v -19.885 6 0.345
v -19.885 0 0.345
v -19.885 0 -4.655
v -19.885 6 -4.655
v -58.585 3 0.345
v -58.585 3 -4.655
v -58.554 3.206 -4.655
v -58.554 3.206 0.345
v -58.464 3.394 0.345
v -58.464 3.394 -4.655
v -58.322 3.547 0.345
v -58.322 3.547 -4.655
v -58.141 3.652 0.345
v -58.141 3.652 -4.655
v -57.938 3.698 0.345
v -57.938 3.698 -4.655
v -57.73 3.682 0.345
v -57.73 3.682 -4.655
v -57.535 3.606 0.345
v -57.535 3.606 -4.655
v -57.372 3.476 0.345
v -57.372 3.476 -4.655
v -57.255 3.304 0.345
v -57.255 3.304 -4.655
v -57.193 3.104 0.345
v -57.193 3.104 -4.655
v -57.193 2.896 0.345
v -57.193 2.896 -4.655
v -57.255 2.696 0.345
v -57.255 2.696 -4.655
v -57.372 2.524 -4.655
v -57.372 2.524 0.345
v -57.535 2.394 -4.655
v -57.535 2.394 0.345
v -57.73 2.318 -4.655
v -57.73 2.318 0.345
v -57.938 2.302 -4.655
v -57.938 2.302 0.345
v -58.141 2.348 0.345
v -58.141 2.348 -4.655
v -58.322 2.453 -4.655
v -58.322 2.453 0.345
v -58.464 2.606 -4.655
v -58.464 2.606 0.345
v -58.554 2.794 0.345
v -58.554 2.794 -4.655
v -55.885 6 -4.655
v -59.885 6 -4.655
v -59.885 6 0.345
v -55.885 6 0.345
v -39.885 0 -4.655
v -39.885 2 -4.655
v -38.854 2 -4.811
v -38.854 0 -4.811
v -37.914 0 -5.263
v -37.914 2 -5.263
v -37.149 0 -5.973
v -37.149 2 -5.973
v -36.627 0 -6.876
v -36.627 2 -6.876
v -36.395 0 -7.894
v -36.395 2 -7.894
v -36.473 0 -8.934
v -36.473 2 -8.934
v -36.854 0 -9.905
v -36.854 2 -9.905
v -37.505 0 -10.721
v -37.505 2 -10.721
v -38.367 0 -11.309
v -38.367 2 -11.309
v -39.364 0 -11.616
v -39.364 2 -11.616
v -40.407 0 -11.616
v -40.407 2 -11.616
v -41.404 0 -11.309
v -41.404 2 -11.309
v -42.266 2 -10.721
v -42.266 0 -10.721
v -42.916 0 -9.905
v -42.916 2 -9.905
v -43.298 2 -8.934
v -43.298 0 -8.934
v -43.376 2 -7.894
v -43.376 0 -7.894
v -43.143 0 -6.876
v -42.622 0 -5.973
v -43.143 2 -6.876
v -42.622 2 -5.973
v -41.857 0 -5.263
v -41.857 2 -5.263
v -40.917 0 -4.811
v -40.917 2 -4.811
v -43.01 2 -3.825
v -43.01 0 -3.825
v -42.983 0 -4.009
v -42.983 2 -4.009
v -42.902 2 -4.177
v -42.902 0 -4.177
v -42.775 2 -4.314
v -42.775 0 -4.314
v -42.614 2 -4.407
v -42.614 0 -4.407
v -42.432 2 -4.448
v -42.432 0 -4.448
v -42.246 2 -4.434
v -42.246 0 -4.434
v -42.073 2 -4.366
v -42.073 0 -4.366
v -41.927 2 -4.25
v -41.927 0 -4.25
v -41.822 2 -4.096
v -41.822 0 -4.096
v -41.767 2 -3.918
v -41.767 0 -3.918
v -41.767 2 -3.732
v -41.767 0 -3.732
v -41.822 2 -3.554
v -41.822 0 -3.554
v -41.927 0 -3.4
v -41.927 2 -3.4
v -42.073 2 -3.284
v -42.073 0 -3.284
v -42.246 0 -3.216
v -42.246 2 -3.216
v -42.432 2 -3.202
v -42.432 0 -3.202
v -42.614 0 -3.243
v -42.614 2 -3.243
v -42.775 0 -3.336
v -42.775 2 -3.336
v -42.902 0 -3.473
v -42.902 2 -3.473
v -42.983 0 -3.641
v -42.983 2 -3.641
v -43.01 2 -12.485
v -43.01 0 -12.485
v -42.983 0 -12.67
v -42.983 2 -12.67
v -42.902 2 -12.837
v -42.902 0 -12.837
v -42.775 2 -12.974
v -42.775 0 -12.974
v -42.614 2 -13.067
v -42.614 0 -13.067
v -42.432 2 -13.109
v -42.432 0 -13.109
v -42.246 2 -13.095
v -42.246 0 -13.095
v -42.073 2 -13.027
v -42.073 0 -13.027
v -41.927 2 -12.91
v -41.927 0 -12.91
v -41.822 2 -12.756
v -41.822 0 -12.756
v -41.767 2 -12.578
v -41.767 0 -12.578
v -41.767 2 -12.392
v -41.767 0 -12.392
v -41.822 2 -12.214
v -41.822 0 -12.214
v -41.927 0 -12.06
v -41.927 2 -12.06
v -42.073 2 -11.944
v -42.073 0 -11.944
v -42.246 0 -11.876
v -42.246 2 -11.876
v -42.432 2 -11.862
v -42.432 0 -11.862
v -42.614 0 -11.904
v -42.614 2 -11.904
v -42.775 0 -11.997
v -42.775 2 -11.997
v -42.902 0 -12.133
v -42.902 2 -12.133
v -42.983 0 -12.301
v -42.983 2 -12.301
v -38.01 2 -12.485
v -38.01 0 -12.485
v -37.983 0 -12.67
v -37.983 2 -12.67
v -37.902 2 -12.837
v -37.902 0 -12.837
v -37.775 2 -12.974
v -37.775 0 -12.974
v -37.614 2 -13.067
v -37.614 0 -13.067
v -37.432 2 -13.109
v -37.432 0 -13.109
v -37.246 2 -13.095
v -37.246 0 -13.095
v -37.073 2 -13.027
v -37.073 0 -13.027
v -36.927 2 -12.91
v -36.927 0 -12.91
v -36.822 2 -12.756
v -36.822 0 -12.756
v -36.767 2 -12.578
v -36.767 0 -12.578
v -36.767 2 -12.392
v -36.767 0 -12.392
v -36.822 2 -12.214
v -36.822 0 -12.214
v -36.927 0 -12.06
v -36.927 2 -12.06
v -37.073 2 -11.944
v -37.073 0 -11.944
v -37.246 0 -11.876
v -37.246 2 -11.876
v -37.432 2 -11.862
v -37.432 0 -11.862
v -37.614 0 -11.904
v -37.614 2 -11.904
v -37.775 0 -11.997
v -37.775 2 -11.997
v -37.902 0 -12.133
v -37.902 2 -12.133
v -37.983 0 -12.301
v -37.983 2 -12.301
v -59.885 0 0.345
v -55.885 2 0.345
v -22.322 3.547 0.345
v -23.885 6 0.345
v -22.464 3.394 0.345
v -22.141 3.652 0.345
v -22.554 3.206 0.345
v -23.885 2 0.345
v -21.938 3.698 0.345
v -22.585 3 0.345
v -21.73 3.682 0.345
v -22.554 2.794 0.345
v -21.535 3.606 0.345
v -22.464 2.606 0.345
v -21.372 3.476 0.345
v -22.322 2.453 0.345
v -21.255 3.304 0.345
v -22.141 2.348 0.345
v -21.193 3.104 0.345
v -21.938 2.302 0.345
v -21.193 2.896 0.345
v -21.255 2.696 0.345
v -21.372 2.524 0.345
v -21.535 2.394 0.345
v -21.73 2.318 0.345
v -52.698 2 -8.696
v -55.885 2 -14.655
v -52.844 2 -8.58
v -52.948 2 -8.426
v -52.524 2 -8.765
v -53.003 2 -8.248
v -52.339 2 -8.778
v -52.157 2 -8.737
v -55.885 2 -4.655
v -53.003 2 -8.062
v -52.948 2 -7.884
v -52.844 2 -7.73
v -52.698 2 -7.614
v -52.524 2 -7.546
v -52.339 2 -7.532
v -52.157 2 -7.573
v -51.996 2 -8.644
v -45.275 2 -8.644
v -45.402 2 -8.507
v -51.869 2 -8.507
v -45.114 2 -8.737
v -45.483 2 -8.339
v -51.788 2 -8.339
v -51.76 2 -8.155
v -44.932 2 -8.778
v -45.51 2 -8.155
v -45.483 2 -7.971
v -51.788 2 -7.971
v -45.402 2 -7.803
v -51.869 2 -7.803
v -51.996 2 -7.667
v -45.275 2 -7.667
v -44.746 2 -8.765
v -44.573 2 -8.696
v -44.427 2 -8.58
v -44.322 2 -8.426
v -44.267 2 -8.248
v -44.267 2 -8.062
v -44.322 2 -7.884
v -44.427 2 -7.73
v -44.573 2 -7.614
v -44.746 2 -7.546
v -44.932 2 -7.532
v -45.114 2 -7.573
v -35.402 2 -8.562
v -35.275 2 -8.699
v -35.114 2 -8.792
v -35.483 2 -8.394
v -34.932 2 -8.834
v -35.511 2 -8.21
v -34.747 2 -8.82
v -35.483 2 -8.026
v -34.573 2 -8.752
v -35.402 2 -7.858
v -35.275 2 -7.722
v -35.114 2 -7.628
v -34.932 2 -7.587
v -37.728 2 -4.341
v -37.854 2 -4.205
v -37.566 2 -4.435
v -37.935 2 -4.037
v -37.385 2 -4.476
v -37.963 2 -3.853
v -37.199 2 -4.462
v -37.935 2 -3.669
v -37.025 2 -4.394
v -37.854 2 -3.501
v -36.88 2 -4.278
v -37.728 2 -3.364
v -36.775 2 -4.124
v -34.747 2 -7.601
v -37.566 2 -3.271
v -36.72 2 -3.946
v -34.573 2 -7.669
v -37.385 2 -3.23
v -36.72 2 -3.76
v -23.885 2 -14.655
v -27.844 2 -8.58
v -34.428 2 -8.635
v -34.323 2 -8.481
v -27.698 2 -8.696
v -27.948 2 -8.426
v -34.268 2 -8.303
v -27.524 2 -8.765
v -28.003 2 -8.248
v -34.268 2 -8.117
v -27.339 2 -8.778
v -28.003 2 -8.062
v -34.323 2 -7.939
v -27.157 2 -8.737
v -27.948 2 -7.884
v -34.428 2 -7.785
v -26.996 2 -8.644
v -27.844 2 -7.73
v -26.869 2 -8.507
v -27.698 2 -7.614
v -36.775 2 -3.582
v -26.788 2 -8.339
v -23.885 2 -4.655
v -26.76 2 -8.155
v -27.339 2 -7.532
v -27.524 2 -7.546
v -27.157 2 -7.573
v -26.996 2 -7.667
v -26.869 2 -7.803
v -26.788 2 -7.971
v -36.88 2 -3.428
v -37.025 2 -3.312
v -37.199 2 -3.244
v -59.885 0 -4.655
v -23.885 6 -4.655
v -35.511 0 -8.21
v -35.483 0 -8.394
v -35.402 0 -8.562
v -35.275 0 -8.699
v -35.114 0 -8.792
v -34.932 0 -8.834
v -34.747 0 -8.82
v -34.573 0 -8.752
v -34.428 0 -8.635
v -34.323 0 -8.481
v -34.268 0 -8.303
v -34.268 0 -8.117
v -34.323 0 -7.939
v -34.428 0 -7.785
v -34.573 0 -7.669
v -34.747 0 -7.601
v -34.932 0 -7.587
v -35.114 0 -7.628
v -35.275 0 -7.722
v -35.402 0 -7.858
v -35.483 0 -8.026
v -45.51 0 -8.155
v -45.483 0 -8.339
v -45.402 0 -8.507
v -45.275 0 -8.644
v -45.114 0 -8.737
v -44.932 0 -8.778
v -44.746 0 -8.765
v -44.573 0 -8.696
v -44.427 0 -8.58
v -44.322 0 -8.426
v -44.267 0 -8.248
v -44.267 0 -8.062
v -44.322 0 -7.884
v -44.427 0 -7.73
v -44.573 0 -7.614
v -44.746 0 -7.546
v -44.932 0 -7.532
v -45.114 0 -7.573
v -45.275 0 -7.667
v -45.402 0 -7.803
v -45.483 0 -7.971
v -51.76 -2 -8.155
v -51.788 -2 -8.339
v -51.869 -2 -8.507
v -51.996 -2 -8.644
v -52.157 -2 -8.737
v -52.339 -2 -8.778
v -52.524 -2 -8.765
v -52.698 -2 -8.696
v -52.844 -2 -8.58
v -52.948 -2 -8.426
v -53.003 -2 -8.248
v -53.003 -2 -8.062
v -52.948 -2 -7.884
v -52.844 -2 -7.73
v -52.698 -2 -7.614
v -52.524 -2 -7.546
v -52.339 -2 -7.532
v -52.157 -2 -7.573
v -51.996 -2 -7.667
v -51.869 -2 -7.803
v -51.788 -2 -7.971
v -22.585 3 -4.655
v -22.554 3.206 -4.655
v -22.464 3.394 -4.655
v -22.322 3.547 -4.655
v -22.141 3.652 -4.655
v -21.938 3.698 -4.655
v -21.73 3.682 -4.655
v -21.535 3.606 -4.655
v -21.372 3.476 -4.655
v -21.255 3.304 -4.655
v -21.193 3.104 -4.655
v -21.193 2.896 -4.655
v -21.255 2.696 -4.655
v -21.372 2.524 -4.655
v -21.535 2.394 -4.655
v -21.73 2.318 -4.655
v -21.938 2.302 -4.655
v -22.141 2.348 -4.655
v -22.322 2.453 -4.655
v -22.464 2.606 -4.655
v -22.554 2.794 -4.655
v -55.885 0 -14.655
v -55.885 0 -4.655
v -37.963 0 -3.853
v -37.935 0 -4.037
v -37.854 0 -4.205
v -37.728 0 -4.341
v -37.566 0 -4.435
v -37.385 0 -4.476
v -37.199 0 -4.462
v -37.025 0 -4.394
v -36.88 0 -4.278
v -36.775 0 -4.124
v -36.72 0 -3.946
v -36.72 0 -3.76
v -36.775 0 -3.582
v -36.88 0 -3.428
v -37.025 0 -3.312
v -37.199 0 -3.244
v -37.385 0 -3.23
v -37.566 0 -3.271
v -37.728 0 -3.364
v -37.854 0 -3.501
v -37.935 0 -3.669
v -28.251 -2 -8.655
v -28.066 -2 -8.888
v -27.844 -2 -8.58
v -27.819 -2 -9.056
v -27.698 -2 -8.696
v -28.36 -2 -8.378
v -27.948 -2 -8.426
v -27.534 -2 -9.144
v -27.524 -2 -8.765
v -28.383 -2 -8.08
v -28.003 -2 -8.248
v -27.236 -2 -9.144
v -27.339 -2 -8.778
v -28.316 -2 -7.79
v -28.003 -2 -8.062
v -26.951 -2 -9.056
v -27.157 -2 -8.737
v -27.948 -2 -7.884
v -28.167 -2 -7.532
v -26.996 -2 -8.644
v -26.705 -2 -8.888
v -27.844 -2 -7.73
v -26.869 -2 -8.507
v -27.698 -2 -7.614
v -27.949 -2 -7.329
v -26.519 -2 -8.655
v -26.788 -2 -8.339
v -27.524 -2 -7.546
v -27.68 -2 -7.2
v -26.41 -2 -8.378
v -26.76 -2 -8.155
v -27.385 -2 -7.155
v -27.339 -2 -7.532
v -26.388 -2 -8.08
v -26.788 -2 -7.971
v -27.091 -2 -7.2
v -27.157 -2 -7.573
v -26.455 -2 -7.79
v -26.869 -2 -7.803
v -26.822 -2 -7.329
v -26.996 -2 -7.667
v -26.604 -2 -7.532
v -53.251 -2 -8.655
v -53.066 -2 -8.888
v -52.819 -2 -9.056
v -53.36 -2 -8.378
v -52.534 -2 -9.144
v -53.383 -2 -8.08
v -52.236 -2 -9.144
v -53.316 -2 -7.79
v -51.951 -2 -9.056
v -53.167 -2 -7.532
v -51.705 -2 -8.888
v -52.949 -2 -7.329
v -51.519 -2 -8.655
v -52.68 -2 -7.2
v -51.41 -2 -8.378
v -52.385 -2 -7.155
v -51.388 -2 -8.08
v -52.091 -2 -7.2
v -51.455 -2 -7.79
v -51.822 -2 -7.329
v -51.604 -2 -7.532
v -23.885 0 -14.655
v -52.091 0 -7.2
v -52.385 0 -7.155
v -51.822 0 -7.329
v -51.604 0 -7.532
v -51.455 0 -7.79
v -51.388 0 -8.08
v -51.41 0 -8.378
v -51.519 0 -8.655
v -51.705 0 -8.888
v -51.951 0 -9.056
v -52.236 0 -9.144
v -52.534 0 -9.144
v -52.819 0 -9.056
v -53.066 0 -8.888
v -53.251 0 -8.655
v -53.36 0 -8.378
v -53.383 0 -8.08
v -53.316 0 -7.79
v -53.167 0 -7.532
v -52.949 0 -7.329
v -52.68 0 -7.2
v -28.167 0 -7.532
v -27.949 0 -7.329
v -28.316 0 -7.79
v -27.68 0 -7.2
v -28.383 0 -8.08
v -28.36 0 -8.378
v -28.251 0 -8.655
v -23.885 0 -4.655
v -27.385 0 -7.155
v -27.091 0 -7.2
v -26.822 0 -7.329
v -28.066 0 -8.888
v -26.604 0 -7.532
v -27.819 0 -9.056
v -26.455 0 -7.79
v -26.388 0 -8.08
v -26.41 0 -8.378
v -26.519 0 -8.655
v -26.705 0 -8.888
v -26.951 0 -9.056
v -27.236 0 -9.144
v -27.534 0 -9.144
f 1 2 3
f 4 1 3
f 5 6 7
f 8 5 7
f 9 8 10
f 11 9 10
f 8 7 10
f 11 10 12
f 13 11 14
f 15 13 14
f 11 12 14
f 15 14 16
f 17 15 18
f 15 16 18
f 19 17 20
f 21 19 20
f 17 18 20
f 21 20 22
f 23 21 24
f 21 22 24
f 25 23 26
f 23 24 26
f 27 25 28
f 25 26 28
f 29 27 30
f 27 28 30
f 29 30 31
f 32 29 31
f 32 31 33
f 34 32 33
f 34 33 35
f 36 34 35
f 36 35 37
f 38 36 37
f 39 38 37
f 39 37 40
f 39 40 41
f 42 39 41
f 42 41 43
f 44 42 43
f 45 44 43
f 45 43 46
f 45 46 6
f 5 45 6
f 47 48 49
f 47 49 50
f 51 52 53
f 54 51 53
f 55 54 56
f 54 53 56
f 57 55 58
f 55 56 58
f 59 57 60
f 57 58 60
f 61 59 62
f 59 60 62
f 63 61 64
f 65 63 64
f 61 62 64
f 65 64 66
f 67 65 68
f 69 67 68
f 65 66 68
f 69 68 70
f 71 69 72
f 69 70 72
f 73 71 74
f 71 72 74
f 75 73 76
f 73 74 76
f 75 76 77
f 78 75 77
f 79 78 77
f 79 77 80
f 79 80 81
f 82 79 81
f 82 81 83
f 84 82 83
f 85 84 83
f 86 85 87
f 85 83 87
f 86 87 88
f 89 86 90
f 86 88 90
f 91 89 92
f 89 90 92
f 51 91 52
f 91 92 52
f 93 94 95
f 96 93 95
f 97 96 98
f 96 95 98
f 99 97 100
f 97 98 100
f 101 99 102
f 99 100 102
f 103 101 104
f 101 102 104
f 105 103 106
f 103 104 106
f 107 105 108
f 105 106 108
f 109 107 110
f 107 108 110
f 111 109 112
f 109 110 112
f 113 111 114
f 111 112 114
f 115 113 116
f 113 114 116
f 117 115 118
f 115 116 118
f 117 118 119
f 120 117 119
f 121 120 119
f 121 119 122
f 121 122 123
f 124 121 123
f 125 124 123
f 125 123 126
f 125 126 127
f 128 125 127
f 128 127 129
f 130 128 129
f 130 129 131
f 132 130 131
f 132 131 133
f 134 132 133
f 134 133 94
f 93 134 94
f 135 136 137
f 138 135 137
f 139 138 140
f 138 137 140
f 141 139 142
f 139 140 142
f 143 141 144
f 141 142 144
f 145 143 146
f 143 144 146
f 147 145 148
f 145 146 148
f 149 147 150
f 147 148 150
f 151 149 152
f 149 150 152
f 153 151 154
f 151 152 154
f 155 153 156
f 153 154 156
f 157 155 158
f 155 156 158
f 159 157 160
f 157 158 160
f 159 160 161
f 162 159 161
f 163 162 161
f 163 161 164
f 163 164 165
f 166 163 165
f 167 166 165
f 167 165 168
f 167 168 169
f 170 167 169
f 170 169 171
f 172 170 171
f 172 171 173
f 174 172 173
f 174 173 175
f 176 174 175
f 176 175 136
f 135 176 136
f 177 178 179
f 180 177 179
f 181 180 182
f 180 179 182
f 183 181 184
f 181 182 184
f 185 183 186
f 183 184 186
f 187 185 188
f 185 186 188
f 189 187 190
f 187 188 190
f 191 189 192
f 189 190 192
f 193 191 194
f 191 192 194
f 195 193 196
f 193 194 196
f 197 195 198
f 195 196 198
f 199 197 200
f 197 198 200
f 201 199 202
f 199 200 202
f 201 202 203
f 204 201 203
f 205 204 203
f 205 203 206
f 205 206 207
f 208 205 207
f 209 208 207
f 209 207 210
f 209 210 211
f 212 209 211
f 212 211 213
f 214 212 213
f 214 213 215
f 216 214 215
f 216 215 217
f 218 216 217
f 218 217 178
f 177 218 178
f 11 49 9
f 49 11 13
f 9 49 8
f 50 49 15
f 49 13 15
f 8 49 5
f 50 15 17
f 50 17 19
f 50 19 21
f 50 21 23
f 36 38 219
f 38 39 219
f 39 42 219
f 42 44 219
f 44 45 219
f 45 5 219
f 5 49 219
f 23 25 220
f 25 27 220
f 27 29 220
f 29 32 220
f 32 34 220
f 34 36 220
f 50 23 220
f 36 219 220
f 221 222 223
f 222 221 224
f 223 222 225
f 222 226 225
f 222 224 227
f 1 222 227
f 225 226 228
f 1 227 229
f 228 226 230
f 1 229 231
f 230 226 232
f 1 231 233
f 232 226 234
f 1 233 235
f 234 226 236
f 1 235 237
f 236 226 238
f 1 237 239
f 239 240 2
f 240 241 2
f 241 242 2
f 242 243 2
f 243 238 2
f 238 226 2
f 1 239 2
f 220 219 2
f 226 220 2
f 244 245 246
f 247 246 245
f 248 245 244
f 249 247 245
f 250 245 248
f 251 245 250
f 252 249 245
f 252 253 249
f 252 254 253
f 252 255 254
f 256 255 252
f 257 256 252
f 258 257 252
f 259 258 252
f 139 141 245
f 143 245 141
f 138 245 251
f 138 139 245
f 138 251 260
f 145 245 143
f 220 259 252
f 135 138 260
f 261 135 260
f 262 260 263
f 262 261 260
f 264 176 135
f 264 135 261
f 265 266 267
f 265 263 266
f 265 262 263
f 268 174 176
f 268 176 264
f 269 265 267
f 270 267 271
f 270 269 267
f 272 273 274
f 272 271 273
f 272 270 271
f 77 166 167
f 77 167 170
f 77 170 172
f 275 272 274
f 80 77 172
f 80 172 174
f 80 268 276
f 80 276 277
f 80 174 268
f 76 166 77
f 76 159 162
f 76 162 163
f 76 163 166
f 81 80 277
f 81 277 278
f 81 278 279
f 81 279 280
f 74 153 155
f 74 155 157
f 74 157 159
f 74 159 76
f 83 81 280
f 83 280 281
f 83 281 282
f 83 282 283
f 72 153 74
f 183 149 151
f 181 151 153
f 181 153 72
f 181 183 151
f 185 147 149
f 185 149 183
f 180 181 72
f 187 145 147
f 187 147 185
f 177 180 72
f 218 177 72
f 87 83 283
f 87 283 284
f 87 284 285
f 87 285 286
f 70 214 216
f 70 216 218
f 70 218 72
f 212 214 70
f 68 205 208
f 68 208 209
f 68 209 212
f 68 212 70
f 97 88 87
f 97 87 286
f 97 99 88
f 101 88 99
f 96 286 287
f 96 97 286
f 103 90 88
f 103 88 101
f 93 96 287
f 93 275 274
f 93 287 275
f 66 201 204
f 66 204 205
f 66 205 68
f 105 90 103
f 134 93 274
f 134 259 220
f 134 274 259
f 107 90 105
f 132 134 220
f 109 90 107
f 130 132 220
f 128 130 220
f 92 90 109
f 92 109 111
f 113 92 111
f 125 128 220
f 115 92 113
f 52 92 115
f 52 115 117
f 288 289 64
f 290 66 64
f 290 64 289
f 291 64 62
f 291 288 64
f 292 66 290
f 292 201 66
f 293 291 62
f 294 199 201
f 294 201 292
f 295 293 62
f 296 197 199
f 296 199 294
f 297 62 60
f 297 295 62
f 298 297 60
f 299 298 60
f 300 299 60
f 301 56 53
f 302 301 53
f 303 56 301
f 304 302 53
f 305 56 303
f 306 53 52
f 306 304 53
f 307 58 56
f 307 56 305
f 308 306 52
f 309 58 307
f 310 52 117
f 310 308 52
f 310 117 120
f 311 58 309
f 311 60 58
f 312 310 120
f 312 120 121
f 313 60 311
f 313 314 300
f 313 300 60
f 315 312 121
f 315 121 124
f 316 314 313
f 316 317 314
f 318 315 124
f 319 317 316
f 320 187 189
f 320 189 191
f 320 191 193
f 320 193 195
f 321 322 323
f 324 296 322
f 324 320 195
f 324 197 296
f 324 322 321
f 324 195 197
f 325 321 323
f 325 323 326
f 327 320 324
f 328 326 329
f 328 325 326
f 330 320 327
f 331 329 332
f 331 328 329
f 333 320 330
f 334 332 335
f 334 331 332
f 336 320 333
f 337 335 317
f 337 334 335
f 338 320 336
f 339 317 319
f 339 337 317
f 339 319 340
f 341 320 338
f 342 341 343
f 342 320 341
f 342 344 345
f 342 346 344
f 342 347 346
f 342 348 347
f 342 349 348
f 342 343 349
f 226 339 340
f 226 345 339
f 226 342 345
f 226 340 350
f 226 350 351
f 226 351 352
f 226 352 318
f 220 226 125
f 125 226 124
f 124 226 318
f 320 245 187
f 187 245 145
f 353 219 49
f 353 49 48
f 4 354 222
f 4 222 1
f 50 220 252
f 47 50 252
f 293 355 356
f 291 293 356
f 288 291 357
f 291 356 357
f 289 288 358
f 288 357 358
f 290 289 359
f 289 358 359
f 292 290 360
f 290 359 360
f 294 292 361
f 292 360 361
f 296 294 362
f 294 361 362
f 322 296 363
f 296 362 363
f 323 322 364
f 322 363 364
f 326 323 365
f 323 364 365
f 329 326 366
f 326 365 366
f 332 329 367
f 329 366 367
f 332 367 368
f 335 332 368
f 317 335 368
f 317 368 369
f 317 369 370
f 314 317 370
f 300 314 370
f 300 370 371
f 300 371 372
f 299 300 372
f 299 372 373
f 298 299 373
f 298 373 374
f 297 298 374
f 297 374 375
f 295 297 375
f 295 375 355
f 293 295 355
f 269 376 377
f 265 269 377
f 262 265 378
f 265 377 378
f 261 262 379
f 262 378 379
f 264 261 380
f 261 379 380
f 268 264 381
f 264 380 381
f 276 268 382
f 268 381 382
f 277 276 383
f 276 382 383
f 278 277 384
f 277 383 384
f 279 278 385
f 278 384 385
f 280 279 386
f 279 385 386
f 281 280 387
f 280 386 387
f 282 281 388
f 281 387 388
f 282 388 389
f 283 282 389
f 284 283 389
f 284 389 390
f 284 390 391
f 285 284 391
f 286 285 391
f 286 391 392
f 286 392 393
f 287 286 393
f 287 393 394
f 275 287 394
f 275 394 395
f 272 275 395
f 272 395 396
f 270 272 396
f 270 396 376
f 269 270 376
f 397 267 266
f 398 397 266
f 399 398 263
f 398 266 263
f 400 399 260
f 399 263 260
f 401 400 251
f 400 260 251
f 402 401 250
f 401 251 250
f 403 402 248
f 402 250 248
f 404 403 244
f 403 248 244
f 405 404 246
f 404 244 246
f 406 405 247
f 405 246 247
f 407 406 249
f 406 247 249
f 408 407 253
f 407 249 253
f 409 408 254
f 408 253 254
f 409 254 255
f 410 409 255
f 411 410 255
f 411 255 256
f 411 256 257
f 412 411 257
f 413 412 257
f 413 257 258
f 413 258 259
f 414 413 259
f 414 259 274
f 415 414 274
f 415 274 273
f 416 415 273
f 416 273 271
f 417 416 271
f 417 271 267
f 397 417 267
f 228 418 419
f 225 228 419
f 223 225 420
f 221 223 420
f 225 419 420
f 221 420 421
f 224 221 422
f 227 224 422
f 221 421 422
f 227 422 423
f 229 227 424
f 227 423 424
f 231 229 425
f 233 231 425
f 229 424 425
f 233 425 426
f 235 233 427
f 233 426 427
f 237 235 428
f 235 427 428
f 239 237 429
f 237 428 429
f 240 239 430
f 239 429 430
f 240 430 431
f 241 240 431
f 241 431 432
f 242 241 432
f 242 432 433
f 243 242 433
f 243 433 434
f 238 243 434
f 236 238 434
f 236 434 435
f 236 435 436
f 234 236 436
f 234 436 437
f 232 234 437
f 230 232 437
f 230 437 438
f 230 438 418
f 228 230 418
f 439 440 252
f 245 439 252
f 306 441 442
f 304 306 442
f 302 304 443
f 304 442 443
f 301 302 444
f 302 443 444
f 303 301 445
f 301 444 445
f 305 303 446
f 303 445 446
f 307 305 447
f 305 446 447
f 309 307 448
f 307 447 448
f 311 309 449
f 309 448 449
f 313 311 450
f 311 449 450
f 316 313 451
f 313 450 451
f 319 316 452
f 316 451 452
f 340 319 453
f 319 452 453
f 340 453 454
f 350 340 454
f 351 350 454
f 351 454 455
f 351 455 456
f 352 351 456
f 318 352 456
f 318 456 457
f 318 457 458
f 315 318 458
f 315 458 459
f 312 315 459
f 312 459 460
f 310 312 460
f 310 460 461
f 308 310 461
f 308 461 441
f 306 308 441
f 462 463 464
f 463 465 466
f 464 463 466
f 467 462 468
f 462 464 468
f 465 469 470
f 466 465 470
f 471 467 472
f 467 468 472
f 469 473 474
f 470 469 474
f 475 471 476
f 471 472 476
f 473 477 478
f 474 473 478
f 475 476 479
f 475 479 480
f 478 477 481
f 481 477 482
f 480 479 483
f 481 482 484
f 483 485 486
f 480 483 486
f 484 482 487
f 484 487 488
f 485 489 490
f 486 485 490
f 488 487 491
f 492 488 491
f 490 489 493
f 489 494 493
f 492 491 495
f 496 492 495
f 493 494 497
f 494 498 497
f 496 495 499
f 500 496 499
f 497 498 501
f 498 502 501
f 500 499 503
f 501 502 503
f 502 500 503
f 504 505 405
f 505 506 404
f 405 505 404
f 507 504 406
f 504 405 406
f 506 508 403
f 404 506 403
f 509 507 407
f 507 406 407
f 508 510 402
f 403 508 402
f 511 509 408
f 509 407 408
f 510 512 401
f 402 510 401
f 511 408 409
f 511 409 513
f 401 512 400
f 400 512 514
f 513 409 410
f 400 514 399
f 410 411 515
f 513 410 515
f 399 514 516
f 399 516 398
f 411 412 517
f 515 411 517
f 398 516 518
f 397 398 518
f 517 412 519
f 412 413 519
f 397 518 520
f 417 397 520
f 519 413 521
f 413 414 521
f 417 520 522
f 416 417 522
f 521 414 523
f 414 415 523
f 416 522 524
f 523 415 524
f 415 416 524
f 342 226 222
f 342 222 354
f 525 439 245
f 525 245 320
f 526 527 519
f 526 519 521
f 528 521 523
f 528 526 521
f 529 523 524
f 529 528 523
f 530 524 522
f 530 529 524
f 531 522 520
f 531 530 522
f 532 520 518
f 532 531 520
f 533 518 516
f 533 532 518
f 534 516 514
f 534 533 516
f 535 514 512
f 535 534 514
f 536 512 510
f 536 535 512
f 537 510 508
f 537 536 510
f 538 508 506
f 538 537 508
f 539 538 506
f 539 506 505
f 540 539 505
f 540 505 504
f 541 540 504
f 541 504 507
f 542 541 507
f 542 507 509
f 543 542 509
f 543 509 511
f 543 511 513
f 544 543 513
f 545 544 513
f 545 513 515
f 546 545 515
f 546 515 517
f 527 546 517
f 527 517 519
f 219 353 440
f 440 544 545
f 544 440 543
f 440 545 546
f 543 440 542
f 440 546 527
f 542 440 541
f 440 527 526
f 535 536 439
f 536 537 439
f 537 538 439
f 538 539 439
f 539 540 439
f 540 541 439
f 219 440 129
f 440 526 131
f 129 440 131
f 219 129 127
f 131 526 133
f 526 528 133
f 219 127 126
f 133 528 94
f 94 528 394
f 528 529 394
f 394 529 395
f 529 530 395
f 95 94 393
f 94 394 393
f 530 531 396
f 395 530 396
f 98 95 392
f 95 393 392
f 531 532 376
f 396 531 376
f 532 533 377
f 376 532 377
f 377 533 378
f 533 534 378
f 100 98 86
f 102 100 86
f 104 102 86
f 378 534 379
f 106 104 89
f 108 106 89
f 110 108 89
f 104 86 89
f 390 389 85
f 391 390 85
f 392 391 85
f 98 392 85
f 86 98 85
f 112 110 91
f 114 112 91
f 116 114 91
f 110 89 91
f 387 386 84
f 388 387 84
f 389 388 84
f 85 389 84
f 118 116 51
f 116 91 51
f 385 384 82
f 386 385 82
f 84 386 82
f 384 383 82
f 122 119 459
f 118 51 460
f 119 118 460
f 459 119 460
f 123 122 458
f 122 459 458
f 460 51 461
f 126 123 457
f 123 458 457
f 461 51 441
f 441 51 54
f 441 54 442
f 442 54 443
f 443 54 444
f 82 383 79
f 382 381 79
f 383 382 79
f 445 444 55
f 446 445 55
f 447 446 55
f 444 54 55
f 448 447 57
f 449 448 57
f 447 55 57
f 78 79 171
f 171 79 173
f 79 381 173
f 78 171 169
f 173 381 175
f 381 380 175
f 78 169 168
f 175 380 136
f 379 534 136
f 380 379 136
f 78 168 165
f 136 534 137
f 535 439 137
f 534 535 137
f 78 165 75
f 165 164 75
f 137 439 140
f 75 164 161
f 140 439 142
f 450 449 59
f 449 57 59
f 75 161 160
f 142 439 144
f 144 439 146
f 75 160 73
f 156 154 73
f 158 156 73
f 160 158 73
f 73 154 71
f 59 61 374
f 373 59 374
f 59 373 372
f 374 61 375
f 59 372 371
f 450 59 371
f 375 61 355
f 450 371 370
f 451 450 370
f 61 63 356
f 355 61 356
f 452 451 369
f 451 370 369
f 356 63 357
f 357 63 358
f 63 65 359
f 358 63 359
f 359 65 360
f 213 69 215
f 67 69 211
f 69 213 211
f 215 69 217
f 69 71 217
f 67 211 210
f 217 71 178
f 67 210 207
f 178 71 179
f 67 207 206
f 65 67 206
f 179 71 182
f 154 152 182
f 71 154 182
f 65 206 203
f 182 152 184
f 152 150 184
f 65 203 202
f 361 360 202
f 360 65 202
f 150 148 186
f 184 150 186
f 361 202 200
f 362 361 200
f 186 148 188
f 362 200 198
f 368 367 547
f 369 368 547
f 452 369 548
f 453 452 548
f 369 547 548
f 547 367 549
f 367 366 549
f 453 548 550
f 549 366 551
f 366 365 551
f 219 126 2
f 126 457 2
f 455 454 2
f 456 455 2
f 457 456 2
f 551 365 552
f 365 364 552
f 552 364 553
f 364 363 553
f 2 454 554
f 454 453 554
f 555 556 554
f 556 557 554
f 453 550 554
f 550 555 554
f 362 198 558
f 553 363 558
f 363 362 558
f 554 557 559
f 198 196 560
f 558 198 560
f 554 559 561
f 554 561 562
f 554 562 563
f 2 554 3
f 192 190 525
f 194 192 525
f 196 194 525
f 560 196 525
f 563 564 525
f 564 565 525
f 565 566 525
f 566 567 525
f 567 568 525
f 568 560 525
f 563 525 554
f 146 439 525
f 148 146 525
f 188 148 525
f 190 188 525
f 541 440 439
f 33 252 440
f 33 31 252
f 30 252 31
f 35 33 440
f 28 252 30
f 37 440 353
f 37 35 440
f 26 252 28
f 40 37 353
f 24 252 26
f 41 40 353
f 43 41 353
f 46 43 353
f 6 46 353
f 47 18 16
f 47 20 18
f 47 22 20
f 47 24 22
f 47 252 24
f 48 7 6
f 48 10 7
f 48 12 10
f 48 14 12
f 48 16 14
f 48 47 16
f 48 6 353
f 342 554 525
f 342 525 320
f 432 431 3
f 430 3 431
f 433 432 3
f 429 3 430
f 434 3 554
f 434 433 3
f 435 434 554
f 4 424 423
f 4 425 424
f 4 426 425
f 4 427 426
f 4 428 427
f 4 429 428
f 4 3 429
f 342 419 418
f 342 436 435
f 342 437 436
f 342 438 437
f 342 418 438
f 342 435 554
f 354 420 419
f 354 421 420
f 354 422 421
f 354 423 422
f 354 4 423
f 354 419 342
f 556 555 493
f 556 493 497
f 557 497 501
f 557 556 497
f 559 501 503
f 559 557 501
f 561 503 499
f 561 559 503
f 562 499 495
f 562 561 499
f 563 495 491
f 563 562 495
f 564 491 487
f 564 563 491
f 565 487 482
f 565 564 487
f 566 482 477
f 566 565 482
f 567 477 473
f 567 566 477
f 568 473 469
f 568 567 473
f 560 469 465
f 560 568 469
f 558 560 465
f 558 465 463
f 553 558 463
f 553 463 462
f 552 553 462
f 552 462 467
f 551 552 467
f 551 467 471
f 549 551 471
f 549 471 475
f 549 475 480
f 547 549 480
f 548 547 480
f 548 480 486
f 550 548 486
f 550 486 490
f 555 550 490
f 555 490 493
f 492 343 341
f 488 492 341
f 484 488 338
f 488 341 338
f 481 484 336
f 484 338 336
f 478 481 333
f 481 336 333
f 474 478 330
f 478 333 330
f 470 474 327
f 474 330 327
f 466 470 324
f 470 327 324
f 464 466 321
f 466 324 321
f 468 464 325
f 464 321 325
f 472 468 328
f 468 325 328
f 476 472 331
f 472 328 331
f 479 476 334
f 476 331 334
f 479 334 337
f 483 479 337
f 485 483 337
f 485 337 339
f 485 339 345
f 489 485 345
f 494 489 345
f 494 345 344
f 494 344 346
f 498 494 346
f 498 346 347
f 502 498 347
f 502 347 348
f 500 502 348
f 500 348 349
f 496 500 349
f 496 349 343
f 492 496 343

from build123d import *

# Parameters (mm, degrees)
SKETCH1_W                = 40
SKETCH1_H                = 15
BOSS_EXTRUDE1_DEPTH      = 2
SKETCH2_R                = 3.5
CUT_EXTRUDE1_DEPTH       = 2
SKETCH3_W                = 4
SKETCH3_H                = 15
BOSS_EXTRUDE2_DEPTH      = 4
SKETCH4_R                = 0.7
CUT_EXTRUDE2_DEPTH       = 63.0262757
M1_6X0_35_TAPPED_HOLE5_D = 1.25
SKETCH38_R               = 1
BOSS_EXTRUDE4_DEPTH      = 4
M1_6X0_35_TAPPED_HOLE9_D = 1.25
SKETCH41_W               = 4
SKETCH41_H               = 6
CUT_EXTRUDE3_DEPTH       = 10


with BuildPart() as part:
    # Sketch1 → Boss-Extrude1 (new body)
    with BuildSketch(Plane(origin=(0, 0, 0), x_dir=(1, 0, 0), z_dir=(0, 1, 0))):
        with Locations((-39.885381165, 7.155172414)):
            Rectangle(SKETCH1_W, SKETCH1_H)
    extrude(amount=BOSS_EXTRUDE1_DEPTH)

    # Sketch2 → Cut-Extrude1 (cut)
    with BuildSketch(Plane(origin=(0, 2, 0), x_dir=(1, 0, 0), z_dir=(0, 1, 0))):
        with Locations((-39.885381165, 8.155172414)):
            Circle(SKETCH2_R)
    extrude(amount=-CUT_EXTRUDE1_DEPTH, mode=Mode.SUBTRACT)

    # Sketch3 → Boss-Extrude2 (add)
    with BuildSketch(Plane(origin=(0, 2, 0), x_dir=(1, 0, 0), z_dir=(0, 1, 0))):
        with Locations((-57.885381165, 7.155172414)):
            Rectangle(SKETCH3_W, SKETCH3_H)
        with Locations((-21.885381165, 7.155172414)):
            Rectangle(SKETCH3_W, SKETCH3_H)
    extrude(amount=BOSS_EXTRUDE2_DEPTH)

    # Sketch4 → Cut-Extrude2 (cut, through all)
    with BuildSketch(Plane(origin=(0, 0, -14.655172414), x_dir=(-1, 0, 0), z_dir=(0, 0, -1))):
        with Locations((57.885381165, 3)):
            Circle(SKETCH4_R)
        with Locations((21.885381165, 3)):
            Circle(SKETCH4_R)
    extrude(amount=-CUT_EXTRUDE2_DEPTH, mode=Mode.SUBTRACT)

    # M1.6x0.35 Tapped Hole5 (through all)
    with Locations(Plane(origin=(0, 2, 0), x_dir=(1, 0, 0), z_dir=(0, 1, 0))):
        with Locations((-42.385381165, 3.825045395), (-44.885381165, 8.155172414), (-37.337826877, 3.852851279), (-34.885684623, 8.210258577), (-42.385381165, 12.485299433), (-37.385381165, 12.485299433)):
            Hole(M1_6X0_35_TAPPED_HOLE5_D / 2)

    # Sketch38 → Boss-Extrude4 (add)
    with BuildSketch(Plane(origin=(0, 2, 0), x_dir=(1, 0, 0), z_dir=(0, 1, 0))):
        with Locations((-52.385381165, 8.155172414)):
            Circle(SKETCH38_R)
        with Locations((-27.385381165, 8.155172414)):
            Circle(SKETCH38_R)
    extrude(amount=-BOSS_EXTRUDE4_DEPTH)

    # M1.6x0.35 Tapped Hole9 (through all)
    with Locations(Plane(origin=(0, -2, 0), x_dir=(-1, 0, 0), z_dir=(0, -1, 0))):
        with Locations((52.385381165, 8.155172414), (27.385381165, 8.155172414)):
            Hole(M1_6X0_35_TAPPED_HOLE9_D / 2)

    # Sketch41 → Cut-Extrude3 (cut)
    with BuildSketch(Plane(origin=(0, 0, -14.655172414), x_dir=(-1, 0, 0), z_dir=(0, 0, -1))):
        with Locations((57.885381165, 3)):
            Rectangle(SKETCH41_W, SKETCH41_H)
        with Locations((21.885381165, 3)):
            Rectangle(SKETCH41_W, SKETCH41_H)
    extrude(amount=-CUT_EXTRUDE3_DEPTH, mode=Mode.SUBTRACT)


solid = part.part
